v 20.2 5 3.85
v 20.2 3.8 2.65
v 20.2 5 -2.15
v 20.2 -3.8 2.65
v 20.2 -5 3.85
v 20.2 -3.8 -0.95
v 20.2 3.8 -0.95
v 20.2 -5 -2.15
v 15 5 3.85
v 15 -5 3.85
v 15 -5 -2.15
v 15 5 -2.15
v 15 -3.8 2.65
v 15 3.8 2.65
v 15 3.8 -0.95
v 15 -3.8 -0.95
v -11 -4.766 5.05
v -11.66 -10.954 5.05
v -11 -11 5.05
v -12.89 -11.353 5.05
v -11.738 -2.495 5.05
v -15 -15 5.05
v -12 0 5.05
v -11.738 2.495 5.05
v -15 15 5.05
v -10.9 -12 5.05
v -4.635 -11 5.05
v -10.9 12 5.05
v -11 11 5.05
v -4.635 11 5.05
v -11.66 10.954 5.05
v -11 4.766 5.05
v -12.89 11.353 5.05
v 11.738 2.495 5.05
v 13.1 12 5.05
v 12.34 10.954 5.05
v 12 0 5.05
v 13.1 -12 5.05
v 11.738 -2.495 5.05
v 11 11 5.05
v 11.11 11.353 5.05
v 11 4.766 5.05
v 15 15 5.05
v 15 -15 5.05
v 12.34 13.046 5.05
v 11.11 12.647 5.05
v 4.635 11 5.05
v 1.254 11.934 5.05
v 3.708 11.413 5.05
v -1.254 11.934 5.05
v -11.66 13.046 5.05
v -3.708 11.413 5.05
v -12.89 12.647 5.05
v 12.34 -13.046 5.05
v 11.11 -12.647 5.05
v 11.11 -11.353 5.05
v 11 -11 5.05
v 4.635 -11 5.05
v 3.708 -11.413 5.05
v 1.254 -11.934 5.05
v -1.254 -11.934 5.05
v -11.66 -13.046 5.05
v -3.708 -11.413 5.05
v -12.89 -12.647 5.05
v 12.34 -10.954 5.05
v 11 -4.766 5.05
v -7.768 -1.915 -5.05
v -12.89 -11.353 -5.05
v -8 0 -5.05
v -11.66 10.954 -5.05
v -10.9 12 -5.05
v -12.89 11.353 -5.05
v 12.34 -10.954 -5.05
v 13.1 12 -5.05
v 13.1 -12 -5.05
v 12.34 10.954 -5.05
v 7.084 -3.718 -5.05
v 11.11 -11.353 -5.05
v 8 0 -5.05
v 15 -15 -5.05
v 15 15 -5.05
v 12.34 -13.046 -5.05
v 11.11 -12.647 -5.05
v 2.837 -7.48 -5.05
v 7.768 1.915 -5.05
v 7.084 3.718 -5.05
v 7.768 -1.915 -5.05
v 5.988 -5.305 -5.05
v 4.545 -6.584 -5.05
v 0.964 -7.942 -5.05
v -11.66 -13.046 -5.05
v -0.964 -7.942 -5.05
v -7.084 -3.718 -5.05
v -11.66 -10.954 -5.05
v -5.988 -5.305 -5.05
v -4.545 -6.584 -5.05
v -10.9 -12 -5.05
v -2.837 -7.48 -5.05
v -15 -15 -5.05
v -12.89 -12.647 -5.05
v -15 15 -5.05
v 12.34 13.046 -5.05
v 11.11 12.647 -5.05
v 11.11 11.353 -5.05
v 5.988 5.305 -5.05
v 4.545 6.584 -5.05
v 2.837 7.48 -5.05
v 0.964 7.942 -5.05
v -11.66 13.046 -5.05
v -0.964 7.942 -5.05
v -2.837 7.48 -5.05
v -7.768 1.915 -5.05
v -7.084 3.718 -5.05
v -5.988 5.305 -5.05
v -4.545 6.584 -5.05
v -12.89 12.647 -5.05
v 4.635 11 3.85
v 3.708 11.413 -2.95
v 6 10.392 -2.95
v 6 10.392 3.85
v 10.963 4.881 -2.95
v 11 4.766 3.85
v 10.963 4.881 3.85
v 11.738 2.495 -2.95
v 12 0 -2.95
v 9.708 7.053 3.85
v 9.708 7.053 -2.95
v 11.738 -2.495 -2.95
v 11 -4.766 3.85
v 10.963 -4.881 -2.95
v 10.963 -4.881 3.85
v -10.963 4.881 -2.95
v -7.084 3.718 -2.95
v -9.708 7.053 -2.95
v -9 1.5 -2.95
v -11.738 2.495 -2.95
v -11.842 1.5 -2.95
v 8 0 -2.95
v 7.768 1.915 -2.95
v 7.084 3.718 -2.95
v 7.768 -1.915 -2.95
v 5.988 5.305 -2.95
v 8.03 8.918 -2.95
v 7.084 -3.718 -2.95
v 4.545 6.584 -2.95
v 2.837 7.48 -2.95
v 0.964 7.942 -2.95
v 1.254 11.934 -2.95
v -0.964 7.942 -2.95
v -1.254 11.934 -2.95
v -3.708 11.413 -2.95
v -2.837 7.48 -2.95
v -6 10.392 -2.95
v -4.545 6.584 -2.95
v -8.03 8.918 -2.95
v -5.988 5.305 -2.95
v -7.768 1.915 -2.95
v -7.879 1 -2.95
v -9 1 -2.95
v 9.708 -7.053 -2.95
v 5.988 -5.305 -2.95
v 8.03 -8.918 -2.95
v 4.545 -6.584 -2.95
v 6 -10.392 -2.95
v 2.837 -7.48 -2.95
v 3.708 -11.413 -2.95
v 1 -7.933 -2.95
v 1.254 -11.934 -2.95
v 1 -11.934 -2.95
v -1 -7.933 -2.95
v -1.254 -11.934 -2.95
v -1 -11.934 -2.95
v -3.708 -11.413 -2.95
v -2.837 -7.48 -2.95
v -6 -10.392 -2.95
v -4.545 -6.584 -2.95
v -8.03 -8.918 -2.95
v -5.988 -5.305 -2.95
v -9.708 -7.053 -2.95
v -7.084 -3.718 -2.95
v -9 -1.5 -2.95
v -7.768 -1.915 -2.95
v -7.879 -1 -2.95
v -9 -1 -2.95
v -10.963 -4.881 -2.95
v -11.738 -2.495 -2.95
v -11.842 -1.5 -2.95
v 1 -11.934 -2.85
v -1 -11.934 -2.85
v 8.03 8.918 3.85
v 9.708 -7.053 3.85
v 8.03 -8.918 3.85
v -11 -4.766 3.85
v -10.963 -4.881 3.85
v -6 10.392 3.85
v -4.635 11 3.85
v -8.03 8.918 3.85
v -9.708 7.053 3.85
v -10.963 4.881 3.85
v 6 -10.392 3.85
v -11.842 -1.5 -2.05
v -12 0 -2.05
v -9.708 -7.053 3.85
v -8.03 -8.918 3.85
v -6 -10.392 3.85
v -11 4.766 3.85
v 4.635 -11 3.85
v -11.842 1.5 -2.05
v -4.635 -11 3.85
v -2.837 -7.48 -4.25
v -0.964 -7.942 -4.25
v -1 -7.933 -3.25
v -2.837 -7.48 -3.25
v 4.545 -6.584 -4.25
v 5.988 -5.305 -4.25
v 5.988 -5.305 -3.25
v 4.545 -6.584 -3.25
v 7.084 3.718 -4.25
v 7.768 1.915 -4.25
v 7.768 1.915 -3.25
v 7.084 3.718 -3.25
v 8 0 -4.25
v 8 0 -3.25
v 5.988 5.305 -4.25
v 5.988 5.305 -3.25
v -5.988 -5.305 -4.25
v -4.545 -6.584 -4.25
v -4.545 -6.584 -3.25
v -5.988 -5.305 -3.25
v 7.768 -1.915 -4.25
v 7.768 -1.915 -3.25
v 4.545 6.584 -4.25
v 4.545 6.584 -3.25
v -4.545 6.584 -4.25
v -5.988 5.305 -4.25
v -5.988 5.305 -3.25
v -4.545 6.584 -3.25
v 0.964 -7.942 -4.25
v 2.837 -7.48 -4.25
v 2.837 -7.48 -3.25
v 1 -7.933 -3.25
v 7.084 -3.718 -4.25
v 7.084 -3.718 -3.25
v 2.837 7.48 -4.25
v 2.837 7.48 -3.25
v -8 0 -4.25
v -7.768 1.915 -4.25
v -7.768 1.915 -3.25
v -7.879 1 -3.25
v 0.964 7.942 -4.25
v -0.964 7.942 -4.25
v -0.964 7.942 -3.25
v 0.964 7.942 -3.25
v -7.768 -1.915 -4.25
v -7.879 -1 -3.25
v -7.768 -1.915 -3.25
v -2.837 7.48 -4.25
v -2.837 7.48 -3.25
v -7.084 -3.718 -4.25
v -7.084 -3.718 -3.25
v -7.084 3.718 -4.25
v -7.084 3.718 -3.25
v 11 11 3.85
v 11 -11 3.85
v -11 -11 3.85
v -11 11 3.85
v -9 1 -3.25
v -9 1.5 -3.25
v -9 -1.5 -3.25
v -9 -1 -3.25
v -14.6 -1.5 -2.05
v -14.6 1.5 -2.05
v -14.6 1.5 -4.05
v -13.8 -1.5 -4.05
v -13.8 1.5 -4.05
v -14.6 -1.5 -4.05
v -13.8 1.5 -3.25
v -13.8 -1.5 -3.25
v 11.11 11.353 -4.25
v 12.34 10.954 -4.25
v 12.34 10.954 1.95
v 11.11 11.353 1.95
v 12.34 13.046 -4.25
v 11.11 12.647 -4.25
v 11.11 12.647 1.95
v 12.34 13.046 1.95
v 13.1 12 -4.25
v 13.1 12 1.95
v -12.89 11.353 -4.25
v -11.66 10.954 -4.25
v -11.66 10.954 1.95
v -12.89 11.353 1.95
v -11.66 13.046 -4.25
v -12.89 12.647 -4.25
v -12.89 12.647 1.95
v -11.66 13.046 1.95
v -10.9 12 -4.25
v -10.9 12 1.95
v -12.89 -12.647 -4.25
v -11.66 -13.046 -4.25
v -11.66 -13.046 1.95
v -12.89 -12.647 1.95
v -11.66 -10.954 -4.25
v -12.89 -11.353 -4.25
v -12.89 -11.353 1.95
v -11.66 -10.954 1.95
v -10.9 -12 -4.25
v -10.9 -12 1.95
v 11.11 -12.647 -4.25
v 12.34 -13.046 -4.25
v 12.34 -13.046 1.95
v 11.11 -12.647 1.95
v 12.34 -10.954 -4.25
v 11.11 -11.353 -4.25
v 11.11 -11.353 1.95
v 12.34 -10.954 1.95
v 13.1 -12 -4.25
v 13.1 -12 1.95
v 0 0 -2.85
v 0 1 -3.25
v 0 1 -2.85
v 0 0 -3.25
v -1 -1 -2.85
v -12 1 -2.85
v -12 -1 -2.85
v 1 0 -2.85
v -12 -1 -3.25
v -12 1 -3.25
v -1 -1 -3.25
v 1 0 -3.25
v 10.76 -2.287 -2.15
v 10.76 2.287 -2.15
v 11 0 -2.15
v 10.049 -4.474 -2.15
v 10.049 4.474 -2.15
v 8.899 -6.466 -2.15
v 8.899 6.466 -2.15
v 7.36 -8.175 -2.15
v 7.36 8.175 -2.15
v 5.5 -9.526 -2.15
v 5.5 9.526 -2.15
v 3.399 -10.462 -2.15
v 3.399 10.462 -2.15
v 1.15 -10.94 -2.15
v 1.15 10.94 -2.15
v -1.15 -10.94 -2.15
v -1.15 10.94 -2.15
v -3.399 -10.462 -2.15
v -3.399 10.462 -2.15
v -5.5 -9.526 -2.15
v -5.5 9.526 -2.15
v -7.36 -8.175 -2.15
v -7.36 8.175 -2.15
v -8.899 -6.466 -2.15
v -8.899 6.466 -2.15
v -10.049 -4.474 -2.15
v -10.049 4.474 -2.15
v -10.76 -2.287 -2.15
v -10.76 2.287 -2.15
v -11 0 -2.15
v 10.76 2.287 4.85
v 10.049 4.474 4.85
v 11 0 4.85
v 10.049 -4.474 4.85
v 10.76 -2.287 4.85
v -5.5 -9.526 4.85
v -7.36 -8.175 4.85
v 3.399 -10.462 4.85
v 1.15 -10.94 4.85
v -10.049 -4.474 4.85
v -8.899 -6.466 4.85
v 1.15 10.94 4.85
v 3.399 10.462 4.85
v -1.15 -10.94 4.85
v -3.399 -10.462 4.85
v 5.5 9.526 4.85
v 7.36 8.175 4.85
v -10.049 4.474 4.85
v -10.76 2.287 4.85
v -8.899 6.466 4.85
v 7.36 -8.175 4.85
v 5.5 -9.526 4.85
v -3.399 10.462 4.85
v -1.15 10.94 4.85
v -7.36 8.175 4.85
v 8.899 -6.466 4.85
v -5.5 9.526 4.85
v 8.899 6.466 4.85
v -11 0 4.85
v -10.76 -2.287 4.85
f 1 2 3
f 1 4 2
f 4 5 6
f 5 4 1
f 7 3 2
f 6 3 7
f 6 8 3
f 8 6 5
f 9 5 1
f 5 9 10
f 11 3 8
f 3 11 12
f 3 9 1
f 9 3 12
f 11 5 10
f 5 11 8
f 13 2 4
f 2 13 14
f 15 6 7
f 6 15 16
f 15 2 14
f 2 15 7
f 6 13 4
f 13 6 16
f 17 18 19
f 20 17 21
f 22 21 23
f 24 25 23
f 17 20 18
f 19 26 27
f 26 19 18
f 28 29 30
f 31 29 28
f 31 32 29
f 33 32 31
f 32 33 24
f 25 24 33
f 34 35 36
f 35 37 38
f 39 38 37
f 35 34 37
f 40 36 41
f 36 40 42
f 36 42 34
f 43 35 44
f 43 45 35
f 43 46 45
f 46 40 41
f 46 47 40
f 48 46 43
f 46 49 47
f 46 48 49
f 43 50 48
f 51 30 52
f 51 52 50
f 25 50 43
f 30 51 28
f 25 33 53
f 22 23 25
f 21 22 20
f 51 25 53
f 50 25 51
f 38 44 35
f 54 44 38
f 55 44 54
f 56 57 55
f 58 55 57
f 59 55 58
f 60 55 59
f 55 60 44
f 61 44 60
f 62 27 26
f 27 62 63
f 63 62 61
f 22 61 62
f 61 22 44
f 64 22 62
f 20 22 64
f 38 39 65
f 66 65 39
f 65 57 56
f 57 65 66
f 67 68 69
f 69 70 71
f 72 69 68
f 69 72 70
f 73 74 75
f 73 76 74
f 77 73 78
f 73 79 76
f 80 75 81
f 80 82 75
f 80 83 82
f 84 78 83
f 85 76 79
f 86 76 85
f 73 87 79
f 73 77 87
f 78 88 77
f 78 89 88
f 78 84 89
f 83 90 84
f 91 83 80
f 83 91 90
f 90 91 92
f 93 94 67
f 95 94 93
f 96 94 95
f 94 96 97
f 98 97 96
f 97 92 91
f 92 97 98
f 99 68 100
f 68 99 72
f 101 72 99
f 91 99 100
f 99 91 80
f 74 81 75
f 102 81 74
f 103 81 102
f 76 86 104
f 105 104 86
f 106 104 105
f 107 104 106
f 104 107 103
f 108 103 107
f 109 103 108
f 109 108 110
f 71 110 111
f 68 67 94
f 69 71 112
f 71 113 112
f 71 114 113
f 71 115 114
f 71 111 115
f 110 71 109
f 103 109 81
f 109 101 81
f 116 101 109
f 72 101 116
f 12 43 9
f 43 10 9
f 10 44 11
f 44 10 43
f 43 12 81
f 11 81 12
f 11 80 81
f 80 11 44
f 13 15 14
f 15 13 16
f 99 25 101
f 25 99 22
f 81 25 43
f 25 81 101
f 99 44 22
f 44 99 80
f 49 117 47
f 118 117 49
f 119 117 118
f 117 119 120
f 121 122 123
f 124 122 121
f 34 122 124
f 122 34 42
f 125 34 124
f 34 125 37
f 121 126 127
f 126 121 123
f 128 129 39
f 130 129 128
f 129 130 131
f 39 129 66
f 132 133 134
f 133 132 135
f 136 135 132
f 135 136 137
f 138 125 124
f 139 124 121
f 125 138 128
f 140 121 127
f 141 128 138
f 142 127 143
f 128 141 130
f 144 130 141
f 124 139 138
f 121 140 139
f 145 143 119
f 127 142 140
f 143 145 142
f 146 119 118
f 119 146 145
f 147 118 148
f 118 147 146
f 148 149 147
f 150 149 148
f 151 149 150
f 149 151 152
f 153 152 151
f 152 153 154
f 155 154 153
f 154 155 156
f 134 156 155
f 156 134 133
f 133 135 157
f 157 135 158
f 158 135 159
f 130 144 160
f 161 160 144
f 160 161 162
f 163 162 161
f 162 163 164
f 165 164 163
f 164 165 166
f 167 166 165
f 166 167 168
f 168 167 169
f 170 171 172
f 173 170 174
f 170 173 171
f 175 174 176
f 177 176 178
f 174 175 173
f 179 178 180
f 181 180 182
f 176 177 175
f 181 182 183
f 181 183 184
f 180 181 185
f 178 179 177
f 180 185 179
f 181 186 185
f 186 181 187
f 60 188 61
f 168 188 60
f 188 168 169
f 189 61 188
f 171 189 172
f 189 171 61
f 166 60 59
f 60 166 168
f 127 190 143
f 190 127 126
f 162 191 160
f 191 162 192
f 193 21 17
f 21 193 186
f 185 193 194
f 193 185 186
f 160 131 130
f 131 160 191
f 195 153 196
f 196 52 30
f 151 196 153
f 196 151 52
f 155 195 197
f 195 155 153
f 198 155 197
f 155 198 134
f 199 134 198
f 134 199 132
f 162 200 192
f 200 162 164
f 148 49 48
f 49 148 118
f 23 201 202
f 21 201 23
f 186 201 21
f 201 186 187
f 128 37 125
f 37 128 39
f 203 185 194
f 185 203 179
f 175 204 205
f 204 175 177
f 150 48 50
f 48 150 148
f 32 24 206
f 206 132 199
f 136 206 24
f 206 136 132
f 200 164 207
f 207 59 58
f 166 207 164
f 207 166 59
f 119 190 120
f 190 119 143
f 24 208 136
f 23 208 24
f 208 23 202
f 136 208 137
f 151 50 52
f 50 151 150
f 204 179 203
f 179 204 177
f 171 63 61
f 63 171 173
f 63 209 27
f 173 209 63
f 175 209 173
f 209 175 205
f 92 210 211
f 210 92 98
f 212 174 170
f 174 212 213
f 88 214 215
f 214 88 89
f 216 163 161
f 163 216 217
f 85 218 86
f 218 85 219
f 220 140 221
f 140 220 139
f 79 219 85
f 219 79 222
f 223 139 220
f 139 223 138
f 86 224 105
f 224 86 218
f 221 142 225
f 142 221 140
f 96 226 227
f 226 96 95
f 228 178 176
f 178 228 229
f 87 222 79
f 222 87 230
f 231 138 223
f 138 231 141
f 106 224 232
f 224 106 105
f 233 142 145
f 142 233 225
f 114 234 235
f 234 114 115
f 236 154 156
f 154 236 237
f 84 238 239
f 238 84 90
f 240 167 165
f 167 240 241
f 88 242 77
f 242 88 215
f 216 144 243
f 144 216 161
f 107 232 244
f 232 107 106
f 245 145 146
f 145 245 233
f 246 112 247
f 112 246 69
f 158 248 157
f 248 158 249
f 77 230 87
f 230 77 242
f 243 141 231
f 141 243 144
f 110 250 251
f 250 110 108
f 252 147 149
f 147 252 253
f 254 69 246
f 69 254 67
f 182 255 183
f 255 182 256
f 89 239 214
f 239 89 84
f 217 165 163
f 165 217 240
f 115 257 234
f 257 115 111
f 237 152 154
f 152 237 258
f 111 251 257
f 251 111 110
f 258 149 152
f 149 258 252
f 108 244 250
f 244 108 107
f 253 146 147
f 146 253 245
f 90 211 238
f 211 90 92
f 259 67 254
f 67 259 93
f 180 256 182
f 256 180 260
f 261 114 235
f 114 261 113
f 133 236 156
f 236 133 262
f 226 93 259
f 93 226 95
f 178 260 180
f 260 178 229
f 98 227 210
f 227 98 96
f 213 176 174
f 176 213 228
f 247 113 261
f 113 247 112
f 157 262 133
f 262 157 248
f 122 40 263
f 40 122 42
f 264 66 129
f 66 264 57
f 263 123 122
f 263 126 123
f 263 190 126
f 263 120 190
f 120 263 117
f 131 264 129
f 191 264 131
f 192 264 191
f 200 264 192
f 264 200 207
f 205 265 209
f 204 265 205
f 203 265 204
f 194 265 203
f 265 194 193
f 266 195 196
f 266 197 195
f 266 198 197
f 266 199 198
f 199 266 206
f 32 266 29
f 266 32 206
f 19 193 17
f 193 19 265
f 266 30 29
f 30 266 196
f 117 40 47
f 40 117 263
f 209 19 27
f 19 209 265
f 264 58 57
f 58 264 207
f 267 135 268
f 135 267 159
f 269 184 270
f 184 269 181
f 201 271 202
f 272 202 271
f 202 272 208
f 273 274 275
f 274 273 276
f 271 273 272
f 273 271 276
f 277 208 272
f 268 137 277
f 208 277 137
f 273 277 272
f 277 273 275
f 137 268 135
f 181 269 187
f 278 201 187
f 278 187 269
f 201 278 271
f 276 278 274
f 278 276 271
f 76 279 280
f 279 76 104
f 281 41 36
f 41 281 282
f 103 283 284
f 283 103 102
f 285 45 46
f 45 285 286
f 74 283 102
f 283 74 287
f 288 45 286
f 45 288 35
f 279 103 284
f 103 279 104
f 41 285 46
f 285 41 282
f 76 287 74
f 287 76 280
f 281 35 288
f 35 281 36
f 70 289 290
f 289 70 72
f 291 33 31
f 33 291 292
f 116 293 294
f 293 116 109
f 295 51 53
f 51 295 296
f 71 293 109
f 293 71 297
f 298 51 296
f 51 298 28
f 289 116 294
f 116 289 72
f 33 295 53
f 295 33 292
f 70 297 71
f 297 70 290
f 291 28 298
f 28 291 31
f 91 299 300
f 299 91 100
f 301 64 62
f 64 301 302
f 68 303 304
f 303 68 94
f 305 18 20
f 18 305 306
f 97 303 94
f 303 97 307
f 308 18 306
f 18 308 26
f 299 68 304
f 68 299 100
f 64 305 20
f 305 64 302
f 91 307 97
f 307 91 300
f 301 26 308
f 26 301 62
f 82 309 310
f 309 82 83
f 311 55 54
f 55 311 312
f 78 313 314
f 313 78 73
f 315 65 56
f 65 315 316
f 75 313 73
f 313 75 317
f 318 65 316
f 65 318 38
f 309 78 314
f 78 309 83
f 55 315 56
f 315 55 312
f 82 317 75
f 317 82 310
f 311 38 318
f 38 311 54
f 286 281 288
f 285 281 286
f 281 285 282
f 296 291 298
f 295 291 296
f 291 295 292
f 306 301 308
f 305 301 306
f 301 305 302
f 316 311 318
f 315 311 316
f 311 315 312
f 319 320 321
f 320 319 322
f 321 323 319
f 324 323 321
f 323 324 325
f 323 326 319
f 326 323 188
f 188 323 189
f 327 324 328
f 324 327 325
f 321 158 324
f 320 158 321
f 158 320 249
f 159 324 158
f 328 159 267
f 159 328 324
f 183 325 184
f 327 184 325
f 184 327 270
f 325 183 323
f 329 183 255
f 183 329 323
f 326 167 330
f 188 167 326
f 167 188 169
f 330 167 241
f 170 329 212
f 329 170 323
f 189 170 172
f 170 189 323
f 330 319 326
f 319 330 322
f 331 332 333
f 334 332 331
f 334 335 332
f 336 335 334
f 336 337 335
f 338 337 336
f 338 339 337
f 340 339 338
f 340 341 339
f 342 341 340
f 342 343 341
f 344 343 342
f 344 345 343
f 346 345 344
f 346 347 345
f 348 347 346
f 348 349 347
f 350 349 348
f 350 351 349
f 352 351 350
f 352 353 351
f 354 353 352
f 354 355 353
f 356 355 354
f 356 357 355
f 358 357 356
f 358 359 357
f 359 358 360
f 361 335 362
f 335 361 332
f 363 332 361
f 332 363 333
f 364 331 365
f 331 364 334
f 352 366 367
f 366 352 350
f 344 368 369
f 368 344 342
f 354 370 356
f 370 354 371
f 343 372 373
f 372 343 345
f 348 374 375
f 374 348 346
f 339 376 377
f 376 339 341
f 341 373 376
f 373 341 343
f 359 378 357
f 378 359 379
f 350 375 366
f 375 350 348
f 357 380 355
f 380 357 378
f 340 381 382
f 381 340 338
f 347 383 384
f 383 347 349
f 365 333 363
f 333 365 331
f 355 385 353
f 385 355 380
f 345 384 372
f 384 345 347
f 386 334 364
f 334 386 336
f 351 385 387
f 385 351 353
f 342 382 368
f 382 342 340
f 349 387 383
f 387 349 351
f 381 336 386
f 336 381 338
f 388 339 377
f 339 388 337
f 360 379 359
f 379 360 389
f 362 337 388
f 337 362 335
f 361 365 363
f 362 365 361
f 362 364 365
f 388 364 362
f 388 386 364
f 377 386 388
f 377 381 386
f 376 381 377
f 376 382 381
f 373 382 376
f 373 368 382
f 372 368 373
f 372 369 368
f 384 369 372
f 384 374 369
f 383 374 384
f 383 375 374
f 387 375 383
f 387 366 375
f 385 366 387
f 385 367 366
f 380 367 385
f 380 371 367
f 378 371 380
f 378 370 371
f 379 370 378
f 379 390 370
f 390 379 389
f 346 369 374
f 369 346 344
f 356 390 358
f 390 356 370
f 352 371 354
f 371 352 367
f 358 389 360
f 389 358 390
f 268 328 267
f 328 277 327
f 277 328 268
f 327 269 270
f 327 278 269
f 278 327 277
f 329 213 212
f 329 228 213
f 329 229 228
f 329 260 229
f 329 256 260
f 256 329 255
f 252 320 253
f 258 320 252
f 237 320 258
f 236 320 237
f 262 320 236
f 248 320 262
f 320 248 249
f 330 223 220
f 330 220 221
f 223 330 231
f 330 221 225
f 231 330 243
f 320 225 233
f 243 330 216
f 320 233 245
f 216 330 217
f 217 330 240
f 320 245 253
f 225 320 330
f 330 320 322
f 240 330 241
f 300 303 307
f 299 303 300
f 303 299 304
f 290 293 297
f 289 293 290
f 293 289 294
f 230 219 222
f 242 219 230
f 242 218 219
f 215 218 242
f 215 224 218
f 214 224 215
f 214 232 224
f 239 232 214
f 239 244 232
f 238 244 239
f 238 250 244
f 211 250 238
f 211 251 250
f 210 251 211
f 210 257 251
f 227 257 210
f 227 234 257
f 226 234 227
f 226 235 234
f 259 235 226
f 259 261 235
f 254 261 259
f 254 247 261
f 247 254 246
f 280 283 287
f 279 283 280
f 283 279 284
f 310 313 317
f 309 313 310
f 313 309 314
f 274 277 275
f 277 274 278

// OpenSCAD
// Parameters
L = 30.0; //[15.0:60.0:0.1]
W = 30.0; //[15.0:60.0:0.1]
H = 10.1; //[5.0:20.2:0.1]
wall_t = 1.2; //[0.6:2.4:0.1]
cavity_d = 24.0; //[12.0:48.0:0.1]
cavity_depth = 8.0; //[4.0:16.0:0.1]
inlet_d = 16.0; //[8.0:32.0:0.1]
outlet_w = 10.0; //[5.0:20.0:0.1]
outlet_h = 6.0; //[3.0:12.0:0.1]
outlet_len = 6.0; //[3.0:12.0:0.1]
impeller_d = 22.0; //[11.0:44.0:0.1]
impeller_h = 7.0; //[3.5:14.0:0.1]
hub_d = 6.0; //[3.0:12.0:0.1]
hub_h = 7.0; //[3.5:14.0:0.1]
blade_count = 9; //[5:16:1]
blade_t = 0.8; //[0.4:1.6:0.1]
blade_height = 6.5; //[3.0:13.0:0.1]
base_t = 1.0; //[0.5:2.0:0.1]
mount_hole_d = 2.2; //[1.2:4.4:0.1]
mount_hole_edge_offset = 3.0; //[1.5:6.0:0.1]
boss_od = 5.6; //[3.0:10.0:0.1]
boss_h = 6.0; //[3.0:9.0:0.1]
fillet_r = 2.0; //[0.8:4.0:0.1]
label_recess_depth = 0.4; //[0.2:1.0:0.1]
label_recess_margin = 4.0; //[2.0:8.0:0.1]
wire_slot_w = 3.0; //[1.5:6.0:0.1]
wire_slot_h = 2.0; //[1.0:4.0:0.1]
wire_slot_len = 4.0; //[2.0:8.0:0.1]
strut_w = 2.0; //[1.0:4.0:0.1]
strut_t = 1.2; //[0.6:2.4:0.1]
eps = 0.8; //[0.2:1.5:0.1]

// Base Shapes
module housing_main_body() {
  translate([0, 0, 0])
    cube([L, W, H], center=true);
}

module impeller_cavity() {
  translate([0, 0, H/2 - cavity_depth/2 + eps/2])
    cylinder(h=cavity_depth + eps, r=cavity_d/2, center=true);
}

module inlet_opening() {
  translate([0, 0, 0])
    cylinder(h=H + 2*eps, r=inlet_d/2, center=true);
}

module outlet_nozzle_outer() {
  translate([L/2 + outlet_len/2 - eps, 0, H/2 - outlet_h/2 - wall_t])
    cube([outlet_len, outlet_w, outlet_h], center=true);
}

module outlet_nozzle_inner() {
  translate([L/2 + outlet_len/2 - eps, 0, H/2 - outlet_h/2 - wall_t])
    cube([outlet_len + 2*eps, outlet_w - 2*wall_t, outlet_h - 2*wall_t], center=true);
}

module base_plate() {
  translate([0, 0, -H/2 + base_t/2 + eps])
    cube([L - 2*wall_t, W - 2*wall_t, base_t], center=true);
}

module mount_hole_cyl(pos) {
  translate(pos)
    cylinder(h=H + 2*eps, r=mount_hole_d/2, center=true);
}

module screw_boss(pos) {
  translate(pos)
    cylinder(h=boss_h, r=boss_od/2, center=true);
}

module corner_fillet_cyl(pos) {
  translate(pos)
    cylinder(h=H, r=fillet_r, center=true);
}

module label_recess() {
  translate([0, 0, H/2 - (label_recess_depth + eps)/2])
    cube([L - 2*label_recess_margin, W - 2*label_recess_margin, label_recess_depth + eps], center=true);
}

module wire_exit_slot() {
  translate([-L/2 + wall_t + wire_slot_len/2, 0, -H/2 + base_t + wire_slot_h/2])
    cube([wire_slot_len + 2*eps, wire_slot_w, wire_slot_h], center=true);
}

module internal_strut_1() {
  translate([-cavity_d/4, 0, -H/2 + base_t + strut_t/2])
    cube([cavity_d/2, strut_w, strut_t], center=true);
}

module internal_strut_2() {
  translate([0, -cavity_d/4, -H/2 + base_t + strut_t/2])
    cube([strut_w, cavity_d/2, strut_t], center=true);
}

module impeller_rotor() {
  translate([0, 0, H/2 - cavity_depth + impeller_h/2 + eps])
    cylinder(h=impeller_h, r=impeller_d/2, center=true);
}

module motor_hub() {
  translate([0, 0, H/2 - cavity_depth + hub_h/2 + eps])
    cylinder(h=hub_h, r=hub_d/2, center=true);
}

module impeller_blade_proto() {
  translate([hub_d/2 + ((impeller_d - hub_d)/2)/2 - eps, 0, H/2 - cavity_depth + blade_height/2 + eps])
    cube([(impeller_d - hub_d)/2, blade_t, blade_height], center=true);
}

// Operations
module outlet_nozzle_shell() {
  difference() {
    outlet_nozzle_outer();
    outlet_nozzle_inner();
  }
}

module corner_fillets_union() {
  union() {
    corner_fillet_cyl([L/2 - fillet_r, W/2 - fillet_r, 0]);
    corner_fillet_cyl([-L/2 + fillet_r, W/2 - fillet_r, 0]);
    corner_fillet_cyl([-L/2 + fillet_r, -W/2 + fillet_r, 0]);
    corner_fillet_cyl([L/2 - fillet_r, -W/2 + fillet_r, 0]);
  }
}

module housing_with_nozzle_and_fillets() {
  union() {
    housing_main_body();
    outlet_nozzle_shell();
    corner_fillets_union();
  }
}

module housing_hollowed() {
  difference() {
    housing_with_nozzle_and_fillets();
    impeller_cavity();
    inlet_opening();
    label_recess();
    wire_exit_slot();
  }
}

module mounting_holes_4x() {
  union() {
    mount_hole_cyl([L/2 - mount_hole_edge_offset, W/2 - mount_hole_edge_offset, 0]);
    mount_hole_cyl([-L/2 + mount_hole_edge_offset, W/2 - mount_hole_edge_offset, 0]);
    mount_hole_cyl([-L/2 + mount_hole_edge_offset, -W/2 + mount_hole_edge_offset, 0]);
    mount_hole_cyl([L/2 - mount_hole_edge_offset, -W/2 + mount_hole_edge_offset, 0]);
  }
}

module housing_with_mount_holes() {
  difference() {
    housing_hollowed();
    mounting_holes_4x();
  }
}

module screw_bosses() {
  union() {
    screw_boss([L/2 - mount_hole_edge_offset, W/2 - mount_hole_edge_offset, -H/2 + base_t + boss_h/2]);
    screw_boss([-L/2 + mount_hole_edge_offset, W/2 - mount_hole_edge_offset, -H/2 + base_t + boss_h/2]);
    screw_boss([-L/2 + mount_hole_edge_offset, -W/2 + mount_hole_edge_offset, -H/2 + base_t + boss_h/2]);
    screw_boss([L/2 - mount_hole_edge_offset, -W/2 + mount_hole_edge_offset, -H/2 + base_t + boss_h/2]);
  }
}

module internal_struts() {
  union() {
    internal_strut_1();
    internal_strut_2();
  }
}

module impeller_blades() {
  union() {
    for (i = [0:blade_count-1]) {
      rotate([0, 0, i*360/blade_count])
        impeller_blade_proto();
    }
  }
}

module impeller_assembly() {
  union() {
    impeller_rotor();
    motor_hub();
    impeller_blades();
  }
}

// Final Model
module complete_model() {
  union() {
    housing_with_mount_holes();
    base_plate();
    screw_bosses();
    internal_struts();
    impeller_assembly();
  }
}

// Render the complete model
color([0.12, 0.12, 0.14]) complete_model();
